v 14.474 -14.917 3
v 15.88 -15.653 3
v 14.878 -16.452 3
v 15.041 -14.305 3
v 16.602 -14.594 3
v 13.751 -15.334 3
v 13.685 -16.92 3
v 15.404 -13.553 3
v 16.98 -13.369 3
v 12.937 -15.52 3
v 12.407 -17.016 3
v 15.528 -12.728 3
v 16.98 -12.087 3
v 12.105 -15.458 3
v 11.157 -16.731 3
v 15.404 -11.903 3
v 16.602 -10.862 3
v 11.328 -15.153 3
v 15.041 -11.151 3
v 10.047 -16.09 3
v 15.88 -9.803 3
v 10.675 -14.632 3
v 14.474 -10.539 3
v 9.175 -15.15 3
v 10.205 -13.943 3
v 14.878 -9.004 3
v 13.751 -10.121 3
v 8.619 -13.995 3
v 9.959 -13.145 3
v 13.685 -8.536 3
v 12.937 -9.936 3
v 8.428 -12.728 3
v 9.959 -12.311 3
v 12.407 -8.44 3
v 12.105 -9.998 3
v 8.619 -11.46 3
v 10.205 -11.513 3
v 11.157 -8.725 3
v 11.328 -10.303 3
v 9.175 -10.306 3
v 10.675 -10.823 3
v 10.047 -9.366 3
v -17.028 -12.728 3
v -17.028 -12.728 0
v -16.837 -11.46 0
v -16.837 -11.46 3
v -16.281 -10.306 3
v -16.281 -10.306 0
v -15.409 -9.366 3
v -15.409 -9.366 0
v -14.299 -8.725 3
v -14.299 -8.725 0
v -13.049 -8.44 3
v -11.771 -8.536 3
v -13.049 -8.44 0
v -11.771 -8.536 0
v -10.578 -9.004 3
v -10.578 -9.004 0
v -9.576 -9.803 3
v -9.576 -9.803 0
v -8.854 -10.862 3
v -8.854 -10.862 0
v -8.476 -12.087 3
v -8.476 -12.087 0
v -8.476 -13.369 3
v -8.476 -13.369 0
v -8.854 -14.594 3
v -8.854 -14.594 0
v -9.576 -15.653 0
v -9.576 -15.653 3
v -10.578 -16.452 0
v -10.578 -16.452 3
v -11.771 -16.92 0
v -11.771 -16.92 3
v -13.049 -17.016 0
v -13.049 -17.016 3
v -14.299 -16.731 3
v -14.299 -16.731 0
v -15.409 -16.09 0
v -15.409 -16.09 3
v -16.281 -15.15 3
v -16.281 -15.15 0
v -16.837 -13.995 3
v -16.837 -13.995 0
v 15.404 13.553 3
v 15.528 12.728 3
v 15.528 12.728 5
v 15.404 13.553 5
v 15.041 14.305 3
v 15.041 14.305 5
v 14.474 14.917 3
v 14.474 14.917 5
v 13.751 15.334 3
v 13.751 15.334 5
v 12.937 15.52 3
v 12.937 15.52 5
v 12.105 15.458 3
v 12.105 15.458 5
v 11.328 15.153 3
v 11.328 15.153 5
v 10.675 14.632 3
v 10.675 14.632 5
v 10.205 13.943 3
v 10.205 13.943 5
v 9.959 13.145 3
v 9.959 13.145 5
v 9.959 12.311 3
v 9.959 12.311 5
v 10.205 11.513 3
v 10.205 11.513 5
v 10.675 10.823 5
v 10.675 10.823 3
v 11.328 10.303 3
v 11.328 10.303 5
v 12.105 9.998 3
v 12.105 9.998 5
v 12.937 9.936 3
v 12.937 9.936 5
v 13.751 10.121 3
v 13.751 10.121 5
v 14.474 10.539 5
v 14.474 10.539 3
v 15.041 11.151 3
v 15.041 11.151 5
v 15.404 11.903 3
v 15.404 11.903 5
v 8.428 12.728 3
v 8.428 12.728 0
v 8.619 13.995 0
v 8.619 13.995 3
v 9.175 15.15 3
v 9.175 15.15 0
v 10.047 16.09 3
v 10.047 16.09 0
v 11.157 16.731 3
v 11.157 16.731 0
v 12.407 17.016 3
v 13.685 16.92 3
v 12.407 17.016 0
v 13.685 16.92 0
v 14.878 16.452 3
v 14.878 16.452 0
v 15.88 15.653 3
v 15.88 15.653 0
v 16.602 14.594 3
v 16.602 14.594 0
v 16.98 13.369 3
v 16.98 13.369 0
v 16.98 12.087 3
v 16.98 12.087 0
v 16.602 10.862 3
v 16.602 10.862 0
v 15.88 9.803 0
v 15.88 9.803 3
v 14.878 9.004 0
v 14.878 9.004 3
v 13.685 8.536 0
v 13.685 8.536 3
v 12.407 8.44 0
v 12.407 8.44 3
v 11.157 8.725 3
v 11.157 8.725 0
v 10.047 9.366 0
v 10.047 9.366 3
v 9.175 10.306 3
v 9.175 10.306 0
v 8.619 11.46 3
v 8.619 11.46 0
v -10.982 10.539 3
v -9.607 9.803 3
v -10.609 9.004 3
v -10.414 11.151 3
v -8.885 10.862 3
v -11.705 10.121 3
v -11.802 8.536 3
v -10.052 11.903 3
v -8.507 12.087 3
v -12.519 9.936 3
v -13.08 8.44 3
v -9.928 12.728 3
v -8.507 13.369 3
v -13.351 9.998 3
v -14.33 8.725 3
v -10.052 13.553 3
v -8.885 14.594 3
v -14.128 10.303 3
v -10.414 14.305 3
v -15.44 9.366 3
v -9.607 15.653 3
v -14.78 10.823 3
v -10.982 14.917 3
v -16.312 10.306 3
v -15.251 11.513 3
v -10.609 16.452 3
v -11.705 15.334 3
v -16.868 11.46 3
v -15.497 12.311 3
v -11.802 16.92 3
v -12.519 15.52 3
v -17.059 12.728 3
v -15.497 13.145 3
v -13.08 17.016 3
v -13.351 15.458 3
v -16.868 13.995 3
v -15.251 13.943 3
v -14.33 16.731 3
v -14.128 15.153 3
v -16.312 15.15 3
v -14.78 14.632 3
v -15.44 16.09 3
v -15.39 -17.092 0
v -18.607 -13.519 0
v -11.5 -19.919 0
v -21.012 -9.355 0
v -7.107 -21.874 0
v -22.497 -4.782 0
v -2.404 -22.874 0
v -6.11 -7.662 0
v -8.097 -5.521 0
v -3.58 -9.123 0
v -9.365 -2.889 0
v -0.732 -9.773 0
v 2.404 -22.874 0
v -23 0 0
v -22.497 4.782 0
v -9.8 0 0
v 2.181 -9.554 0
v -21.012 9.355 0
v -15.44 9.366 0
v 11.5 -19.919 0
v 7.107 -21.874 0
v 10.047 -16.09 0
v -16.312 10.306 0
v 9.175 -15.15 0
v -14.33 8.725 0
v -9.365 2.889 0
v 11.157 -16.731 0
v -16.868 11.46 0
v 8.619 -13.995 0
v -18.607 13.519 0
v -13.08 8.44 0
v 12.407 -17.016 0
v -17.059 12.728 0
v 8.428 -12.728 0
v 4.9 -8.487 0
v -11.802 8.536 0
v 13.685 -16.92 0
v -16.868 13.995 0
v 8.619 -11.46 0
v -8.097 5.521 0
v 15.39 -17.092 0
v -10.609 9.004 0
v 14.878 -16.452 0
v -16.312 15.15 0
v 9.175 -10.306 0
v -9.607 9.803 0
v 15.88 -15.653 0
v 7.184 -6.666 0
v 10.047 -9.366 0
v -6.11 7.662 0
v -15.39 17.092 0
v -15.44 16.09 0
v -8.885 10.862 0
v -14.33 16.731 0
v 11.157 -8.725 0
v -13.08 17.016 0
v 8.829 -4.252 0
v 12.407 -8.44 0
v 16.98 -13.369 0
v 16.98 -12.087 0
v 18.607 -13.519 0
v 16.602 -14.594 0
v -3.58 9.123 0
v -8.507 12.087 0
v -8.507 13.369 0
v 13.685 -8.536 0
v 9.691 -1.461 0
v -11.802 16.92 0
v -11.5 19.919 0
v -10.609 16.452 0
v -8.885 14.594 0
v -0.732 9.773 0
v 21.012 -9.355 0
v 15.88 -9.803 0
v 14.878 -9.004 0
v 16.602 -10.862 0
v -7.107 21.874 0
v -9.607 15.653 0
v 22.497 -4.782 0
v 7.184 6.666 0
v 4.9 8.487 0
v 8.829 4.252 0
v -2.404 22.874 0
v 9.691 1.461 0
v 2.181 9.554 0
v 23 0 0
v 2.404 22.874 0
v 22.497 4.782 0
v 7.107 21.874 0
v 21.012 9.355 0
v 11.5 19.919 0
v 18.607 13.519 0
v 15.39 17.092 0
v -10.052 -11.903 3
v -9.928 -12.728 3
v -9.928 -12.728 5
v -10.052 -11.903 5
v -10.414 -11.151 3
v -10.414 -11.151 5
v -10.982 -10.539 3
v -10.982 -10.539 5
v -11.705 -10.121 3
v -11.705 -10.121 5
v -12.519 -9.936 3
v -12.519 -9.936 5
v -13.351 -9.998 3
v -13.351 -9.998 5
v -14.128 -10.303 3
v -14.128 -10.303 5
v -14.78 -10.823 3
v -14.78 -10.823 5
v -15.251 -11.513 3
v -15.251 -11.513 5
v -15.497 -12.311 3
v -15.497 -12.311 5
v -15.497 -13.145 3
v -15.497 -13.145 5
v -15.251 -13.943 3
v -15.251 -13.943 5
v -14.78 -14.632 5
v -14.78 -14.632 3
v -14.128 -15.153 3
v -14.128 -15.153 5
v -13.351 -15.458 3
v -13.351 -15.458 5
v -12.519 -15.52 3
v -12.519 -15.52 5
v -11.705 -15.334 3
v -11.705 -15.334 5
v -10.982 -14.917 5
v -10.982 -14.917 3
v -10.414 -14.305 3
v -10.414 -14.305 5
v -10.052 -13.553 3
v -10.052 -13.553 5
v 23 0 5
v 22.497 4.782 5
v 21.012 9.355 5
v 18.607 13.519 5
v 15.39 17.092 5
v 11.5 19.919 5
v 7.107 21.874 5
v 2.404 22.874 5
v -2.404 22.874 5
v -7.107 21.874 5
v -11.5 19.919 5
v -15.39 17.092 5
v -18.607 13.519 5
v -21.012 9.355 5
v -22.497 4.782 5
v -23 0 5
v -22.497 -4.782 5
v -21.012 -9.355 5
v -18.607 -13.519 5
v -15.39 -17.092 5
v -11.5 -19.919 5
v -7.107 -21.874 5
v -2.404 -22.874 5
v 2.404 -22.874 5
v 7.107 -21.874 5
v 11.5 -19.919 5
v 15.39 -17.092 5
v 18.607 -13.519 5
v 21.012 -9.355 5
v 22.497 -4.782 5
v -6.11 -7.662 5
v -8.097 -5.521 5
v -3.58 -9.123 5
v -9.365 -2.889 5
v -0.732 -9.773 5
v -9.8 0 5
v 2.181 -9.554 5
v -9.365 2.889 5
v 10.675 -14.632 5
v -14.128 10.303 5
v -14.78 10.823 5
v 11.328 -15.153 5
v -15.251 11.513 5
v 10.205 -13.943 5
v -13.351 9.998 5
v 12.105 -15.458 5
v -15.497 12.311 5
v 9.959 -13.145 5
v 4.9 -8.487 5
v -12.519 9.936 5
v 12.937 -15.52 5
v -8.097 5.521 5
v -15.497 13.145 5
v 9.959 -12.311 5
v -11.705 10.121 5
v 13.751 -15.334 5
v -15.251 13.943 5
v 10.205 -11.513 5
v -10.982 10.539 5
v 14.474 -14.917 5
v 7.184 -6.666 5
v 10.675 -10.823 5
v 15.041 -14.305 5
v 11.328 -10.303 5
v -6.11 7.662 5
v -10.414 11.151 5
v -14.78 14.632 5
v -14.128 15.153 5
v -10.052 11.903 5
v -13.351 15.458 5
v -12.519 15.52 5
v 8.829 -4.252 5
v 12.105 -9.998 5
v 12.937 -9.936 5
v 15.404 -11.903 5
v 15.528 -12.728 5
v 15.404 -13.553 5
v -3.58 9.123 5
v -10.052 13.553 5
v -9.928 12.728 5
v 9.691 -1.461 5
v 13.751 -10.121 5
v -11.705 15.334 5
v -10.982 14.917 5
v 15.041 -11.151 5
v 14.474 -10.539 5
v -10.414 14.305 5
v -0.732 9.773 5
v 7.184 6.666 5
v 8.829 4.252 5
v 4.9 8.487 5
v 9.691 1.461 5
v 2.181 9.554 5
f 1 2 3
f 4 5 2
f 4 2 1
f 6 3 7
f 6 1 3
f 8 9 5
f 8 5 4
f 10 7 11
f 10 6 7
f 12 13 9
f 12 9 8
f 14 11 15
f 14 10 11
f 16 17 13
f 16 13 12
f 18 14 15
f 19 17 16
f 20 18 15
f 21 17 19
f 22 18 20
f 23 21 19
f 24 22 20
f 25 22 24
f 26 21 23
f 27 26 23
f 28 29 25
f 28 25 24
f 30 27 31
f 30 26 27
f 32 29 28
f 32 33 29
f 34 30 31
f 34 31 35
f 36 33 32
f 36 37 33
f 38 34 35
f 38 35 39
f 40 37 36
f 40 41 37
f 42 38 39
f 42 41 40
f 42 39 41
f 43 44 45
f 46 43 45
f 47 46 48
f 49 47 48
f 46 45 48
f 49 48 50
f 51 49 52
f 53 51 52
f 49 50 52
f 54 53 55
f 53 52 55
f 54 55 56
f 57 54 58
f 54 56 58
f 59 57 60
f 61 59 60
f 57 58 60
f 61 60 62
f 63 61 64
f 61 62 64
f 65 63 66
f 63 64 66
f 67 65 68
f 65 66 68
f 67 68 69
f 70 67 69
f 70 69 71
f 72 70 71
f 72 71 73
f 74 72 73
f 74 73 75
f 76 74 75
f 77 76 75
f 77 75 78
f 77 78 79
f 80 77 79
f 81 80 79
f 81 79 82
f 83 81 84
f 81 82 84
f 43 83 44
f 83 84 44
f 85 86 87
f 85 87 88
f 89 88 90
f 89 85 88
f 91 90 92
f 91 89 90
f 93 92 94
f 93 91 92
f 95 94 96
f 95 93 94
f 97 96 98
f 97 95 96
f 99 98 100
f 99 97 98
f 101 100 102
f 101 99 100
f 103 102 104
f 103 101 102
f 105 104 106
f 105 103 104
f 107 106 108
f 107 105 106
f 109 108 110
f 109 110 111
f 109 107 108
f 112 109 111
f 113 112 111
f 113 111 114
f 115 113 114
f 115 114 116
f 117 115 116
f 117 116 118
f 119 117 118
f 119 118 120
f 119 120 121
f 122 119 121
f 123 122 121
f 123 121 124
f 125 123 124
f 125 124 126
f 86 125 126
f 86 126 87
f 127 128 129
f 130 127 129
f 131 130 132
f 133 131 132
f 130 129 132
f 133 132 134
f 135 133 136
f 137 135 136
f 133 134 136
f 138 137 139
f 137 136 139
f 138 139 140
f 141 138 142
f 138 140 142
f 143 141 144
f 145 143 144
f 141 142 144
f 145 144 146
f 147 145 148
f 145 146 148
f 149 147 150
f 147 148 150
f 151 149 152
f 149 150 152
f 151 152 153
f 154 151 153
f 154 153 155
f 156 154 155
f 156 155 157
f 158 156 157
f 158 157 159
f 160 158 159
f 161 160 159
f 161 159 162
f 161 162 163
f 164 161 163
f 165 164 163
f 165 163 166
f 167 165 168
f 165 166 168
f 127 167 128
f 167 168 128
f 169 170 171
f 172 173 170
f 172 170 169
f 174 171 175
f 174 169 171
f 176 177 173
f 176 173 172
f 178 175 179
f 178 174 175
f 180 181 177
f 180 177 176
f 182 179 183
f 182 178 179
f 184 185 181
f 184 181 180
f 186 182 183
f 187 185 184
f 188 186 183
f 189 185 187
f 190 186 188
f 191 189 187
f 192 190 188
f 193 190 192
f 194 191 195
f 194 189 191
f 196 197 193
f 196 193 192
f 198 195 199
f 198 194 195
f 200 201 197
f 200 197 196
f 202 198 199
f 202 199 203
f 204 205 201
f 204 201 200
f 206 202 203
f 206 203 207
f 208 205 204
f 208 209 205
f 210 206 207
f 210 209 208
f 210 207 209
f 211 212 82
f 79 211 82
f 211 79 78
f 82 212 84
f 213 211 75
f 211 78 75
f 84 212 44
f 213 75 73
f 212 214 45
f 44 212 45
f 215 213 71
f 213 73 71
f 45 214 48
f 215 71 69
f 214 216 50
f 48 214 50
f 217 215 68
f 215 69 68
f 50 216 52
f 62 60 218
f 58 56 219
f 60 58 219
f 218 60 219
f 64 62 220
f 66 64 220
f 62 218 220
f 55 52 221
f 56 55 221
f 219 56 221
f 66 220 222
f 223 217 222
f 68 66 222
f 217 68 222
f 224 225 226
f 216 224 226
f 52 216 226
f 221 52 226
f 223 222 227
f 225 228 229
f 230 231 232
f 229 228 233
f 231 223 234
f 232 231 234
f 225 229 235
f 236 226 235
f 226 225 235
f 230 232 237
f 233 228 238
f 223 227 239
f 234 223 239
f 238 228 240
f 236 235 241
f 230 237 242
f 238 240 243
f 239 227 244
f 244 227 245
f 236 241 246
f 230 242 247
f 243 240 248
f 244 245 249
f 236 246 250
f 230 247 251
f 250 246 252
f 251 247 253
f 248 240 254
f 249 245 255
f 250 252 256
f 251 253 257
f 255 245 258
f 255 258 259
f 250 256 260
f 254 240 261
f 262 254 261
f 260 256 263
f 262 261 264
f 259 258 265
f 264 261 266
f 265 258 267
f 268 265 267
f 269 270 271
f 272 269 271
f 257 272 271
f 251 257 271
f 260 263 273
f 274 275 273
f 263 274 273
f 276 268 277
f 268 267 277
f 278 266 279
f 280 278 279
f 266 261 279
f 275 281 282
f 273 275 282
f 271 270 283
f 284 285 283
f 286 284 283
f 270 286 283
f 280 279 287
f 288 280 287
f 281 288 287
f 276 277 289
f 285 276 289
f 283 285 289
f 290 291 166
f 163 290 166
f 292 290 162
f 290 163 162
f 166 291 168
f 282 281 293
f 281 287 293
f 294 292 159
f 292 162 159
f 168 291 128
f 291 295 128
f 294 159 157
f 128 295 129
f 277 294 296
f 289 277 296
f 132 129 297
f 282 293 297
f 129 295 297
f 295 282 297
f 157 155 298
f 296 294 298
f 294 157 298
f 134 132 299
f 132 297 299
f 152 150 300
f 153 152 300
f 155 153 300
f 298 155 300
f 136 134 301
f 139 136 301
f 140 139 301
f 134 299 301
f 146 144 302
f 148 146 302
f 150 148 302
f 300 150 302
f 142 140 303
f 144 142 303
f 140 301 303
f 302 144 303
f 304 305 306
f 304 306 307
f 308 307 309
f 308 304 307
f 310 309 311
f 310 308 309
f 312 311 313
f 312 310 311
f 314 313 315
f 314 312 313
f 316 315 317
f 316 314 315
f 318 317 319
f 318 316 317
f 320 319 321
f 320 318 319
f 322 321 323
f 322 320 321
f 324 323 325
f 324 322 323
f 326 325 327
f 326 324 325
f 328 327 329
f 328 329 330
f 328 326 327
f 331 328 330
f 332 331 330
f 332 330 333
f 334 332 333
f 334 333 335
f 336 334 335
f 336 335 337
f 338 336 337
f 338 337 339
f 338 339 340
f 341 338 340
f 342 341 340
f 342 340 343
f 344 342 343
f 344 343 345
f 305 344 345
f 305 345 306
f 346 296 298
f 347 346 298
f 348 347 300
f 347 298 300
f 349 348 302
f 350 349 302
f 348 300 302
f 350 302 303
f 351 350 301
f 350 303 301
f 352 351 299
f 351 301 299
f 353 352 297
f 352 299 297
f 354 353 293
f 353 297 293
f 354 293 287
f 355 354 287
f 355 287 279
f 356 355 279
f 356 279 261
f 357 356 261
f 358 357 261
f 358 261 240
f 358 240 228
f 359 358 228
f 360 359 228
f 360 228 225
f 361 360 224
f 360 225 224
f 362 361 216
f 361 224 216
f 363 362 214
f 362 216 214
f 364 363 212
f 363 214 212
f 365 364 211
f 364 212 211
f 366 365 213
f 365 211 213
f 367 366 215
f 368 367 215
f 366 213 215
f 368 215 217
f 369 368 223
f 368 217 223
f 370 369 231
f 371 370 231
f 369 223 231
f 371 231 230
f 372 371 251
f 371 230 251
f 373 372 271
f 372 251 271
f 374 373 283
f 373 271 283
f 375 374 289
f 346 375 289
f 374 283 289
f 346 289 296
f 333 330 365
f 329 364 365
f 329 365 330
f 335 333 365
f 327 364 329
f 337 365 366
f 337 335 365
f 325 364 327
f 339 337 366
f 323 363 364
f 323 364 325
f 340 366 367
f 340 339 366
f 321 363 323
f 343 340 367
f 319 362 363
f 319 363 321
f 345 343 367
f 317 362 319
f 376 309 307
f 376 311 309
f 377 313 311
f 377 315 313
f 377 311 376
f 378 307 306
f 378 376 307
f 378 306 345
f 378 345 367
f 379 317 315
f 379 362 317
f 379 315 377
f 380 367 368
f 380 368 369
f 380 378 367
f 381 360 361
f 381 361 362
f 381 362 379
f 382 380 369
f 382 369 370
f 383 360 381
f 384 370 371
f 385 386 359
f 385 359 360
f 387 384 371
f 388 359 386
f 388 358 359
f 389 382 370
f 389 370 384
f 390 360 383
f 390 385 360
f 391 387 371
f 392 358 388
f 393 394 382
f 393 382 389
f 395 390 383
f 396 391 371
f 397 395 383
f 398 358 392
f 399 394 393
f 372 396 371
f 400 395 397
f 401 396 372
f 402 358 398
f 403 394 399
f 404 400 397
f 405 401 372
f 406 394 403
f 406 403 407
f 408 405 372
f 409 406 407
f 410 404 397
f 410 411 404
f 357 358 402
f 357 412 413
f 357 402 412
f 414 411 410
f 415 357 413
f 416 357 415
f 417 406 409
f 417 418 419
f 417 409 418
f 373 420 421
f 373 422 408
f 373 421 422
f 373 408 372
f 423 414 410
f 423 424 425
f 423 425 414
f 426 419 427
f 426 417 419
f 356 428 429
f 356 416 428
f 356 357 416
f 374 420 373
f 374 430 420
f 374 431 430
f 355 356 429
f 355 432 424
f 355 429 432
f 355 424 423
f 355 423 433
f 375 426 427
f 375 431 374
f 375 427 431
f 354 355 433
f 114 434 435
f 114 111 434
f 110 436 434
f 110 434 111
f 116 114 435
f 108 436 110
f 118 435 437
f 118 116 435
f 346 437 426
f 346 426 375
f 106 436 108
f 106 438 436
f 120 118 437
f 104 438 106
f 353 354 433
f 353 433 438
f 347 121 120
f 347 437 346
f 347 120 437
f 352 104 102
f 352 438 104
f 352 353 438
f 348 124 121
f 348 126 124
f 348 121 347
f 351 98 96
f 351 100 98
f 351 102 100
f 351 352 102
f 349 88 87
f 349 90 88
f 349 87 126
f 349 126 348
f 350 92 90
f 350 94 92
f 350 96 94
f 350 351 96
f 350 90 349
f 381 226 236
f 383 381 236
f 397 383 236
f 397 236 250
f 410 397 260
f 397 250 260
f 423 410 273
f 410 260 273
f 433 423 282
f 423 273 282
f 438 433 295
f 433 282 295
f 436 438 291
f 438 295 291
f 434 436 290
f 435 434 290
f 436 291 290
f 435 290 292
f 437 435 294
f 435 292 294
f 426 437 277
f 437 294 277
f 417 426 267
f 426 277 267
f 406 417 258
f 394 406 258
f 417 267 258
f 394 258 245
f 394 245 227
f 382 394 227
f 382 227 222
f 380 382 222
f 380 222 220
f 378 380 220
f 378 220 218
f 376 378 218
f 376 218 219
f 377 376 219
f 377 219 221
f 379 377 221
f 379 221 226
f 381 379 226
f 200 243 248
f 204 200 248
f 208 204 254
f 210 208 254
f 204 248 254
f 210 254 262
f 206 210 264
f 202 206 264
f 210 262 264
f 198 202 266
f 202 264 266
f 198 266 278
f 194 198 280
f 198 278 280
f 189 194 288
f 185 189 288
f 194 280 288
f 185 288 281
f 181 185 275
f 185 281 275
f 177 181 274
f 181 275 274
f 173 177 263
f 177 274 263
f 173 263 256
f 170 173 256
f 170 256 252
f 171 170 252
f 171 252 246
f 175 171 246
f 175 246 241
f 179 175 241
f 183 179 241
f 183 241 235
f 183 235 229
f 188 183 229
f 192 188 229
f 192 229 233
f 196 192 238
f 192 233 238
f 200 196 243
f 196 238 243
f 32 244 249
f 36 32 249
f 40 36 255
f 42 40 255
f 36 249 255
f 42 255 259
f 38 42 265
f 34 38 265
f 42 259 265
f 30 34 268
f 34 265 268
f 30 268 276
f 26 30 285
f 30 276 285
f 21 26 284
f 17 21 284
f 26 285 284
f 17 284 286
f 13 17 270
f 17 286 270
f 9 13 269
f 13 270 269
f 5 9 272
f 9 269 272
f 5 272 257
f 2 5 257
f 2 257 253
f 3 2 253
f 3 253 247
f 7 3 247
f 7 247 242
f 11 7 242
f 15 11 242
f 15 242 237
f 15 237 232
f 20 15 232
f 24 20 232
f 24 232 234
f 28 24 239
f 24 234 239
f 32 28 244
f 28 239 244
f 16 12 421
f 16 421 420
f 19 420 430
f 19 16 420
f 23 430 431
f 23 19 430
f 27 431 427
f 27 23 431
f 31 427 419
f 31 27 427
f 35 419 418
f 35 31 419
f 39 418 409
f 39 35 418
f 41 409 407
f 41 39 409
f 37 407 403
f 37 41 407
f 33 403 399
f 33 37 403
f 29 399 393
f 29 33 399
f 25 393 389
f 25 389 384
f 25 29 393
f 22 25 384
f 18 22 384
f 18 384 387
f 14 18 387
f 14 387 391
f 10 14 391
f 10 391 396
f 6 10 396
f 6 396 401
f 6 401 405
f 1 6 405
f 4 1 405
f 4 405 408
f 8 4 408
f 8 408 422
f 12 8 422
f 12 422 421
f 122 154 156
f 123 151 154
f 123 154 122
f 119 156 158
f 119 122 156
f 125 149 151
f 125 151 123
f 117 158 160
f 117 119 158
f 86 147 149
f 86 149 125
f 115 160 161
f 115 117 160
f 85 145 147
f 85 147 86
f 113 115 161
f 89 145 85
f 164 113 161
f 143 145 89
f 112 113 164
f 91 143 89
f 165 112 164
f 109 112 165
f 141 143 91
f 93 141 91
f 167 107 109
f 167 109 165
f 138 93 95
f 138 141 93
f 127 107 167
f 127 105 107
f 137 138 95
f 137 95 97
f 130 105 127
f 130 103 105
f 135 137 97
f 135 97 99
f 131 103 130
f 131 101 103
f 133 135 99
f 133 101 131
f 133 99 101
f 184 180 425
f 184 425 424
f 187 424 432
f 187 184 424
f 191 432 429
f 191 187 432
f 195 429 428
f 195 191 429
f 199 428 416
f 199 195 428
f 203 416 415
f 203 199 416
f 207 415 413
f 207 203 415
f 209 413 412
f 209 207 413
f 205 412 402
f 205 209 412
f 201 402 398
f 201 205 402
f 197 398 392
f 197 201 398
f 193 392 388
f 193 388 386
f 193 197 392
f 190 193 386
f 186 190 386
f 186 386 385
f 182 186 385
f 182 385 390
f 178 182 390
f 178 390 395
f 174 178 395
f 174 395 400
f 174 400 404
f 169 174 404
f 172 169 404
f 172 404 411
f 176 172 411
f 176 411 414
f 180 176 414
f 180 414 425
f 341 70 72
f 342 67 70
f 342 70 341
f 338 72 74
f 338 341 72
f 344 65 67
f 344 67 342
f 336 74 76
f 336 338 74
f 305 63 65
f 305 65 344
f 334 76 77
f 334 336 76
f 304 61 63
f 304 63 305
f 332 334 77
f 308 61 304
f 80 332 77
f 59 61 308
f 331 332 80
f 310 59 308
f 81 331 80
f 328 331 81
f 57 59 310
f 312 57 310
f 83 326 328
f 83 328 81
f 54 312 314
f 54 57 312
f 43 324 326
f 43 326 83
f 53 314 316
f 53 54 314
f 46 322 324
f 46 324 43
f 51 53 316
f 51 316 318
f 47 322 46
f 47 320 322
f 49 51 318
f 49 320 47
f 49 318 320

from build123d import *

# Parameters (mm, degrees)
SCHIZZO2_R                   = 23
SCHIZZO2_R_2                 = 2.8
ESTRUSIONE_ESTRUSIONE3_DEPTH = 5
SCHIZZO5_R                   = 4.3
TAGLIO_ESTRUSIONE1_DEPTH     = 3
SCHIZZO6_R                   = 9.8
TAGLIO_ESTRUSIONE2_DEPTH     = 33.908965344


with BuildPart() as part:
    # Schizzo2 → Estrusione-Estrusione3 (new body)
    with BuildSketch(Plane.XY):
        Circle(SCHIZZO2_R)
        with Locations((-12.727922061, 12.727922061)):
            Circle(SCHIZZO2_R_2, mode=Mode.SUBTRACT)
        with Locations((12.727922061, 12.727922061)):
            Circle(SCHIZZO2_R_2, mode=Mode.SUBTRACT)
        with Locations((12.727922061, -12.727922061)):
            Circle(SCHIZZO2_R_2, mode=Mode.SUBTRACT)
        with Locations((-12.727922061, -12.727922061)):
            Circle(SCHIZZO2_R_2, mode=Mode.SUBTRACT)
    extrude(amount=ESTRUSIONE_ESTRUSIONE3_DEPTH)

    # Schizzo5 → Taglio-Estrusione1 (cut)
    with BuildSketch(Plane(origin=(0, 0, 0), x_dir=(-1, 0, 0), z_dir=(0, 0, -1))):
        with Locations((-12.727922061, 12.727922061)):
            Circle(SCHIZZO5_R)
        with Locations((12.758824691, 12.727922061)):
            Circle(SCHIZZO5_R)
        with Locations((12.727922061, -12.727922061)):
            Circle(SCHIZZO5_R)
        with Locations((-12.727922061, -12.727922061)):
            Circle(SCHIZZO5_R)
    extrude(amount=-TAGLIO_ESTRUSIONE1_DEPTH, mode=Mode.SUBTRACT)

    # Schizzo6 → Taglio-Estrusione2 (cut, through all)
    with BuildSketch(Plane(origin=(0, 0, 0), x_dir=(-1, 0, 0), z_dir=(0, 0, -1))):
        Circle(SCHIZZO6_R)
    extrude(amount=-TAGLIO_ESTRUSIONE2_DEPTH, mode=Mode.SUBTRACT)


solid = part.part
